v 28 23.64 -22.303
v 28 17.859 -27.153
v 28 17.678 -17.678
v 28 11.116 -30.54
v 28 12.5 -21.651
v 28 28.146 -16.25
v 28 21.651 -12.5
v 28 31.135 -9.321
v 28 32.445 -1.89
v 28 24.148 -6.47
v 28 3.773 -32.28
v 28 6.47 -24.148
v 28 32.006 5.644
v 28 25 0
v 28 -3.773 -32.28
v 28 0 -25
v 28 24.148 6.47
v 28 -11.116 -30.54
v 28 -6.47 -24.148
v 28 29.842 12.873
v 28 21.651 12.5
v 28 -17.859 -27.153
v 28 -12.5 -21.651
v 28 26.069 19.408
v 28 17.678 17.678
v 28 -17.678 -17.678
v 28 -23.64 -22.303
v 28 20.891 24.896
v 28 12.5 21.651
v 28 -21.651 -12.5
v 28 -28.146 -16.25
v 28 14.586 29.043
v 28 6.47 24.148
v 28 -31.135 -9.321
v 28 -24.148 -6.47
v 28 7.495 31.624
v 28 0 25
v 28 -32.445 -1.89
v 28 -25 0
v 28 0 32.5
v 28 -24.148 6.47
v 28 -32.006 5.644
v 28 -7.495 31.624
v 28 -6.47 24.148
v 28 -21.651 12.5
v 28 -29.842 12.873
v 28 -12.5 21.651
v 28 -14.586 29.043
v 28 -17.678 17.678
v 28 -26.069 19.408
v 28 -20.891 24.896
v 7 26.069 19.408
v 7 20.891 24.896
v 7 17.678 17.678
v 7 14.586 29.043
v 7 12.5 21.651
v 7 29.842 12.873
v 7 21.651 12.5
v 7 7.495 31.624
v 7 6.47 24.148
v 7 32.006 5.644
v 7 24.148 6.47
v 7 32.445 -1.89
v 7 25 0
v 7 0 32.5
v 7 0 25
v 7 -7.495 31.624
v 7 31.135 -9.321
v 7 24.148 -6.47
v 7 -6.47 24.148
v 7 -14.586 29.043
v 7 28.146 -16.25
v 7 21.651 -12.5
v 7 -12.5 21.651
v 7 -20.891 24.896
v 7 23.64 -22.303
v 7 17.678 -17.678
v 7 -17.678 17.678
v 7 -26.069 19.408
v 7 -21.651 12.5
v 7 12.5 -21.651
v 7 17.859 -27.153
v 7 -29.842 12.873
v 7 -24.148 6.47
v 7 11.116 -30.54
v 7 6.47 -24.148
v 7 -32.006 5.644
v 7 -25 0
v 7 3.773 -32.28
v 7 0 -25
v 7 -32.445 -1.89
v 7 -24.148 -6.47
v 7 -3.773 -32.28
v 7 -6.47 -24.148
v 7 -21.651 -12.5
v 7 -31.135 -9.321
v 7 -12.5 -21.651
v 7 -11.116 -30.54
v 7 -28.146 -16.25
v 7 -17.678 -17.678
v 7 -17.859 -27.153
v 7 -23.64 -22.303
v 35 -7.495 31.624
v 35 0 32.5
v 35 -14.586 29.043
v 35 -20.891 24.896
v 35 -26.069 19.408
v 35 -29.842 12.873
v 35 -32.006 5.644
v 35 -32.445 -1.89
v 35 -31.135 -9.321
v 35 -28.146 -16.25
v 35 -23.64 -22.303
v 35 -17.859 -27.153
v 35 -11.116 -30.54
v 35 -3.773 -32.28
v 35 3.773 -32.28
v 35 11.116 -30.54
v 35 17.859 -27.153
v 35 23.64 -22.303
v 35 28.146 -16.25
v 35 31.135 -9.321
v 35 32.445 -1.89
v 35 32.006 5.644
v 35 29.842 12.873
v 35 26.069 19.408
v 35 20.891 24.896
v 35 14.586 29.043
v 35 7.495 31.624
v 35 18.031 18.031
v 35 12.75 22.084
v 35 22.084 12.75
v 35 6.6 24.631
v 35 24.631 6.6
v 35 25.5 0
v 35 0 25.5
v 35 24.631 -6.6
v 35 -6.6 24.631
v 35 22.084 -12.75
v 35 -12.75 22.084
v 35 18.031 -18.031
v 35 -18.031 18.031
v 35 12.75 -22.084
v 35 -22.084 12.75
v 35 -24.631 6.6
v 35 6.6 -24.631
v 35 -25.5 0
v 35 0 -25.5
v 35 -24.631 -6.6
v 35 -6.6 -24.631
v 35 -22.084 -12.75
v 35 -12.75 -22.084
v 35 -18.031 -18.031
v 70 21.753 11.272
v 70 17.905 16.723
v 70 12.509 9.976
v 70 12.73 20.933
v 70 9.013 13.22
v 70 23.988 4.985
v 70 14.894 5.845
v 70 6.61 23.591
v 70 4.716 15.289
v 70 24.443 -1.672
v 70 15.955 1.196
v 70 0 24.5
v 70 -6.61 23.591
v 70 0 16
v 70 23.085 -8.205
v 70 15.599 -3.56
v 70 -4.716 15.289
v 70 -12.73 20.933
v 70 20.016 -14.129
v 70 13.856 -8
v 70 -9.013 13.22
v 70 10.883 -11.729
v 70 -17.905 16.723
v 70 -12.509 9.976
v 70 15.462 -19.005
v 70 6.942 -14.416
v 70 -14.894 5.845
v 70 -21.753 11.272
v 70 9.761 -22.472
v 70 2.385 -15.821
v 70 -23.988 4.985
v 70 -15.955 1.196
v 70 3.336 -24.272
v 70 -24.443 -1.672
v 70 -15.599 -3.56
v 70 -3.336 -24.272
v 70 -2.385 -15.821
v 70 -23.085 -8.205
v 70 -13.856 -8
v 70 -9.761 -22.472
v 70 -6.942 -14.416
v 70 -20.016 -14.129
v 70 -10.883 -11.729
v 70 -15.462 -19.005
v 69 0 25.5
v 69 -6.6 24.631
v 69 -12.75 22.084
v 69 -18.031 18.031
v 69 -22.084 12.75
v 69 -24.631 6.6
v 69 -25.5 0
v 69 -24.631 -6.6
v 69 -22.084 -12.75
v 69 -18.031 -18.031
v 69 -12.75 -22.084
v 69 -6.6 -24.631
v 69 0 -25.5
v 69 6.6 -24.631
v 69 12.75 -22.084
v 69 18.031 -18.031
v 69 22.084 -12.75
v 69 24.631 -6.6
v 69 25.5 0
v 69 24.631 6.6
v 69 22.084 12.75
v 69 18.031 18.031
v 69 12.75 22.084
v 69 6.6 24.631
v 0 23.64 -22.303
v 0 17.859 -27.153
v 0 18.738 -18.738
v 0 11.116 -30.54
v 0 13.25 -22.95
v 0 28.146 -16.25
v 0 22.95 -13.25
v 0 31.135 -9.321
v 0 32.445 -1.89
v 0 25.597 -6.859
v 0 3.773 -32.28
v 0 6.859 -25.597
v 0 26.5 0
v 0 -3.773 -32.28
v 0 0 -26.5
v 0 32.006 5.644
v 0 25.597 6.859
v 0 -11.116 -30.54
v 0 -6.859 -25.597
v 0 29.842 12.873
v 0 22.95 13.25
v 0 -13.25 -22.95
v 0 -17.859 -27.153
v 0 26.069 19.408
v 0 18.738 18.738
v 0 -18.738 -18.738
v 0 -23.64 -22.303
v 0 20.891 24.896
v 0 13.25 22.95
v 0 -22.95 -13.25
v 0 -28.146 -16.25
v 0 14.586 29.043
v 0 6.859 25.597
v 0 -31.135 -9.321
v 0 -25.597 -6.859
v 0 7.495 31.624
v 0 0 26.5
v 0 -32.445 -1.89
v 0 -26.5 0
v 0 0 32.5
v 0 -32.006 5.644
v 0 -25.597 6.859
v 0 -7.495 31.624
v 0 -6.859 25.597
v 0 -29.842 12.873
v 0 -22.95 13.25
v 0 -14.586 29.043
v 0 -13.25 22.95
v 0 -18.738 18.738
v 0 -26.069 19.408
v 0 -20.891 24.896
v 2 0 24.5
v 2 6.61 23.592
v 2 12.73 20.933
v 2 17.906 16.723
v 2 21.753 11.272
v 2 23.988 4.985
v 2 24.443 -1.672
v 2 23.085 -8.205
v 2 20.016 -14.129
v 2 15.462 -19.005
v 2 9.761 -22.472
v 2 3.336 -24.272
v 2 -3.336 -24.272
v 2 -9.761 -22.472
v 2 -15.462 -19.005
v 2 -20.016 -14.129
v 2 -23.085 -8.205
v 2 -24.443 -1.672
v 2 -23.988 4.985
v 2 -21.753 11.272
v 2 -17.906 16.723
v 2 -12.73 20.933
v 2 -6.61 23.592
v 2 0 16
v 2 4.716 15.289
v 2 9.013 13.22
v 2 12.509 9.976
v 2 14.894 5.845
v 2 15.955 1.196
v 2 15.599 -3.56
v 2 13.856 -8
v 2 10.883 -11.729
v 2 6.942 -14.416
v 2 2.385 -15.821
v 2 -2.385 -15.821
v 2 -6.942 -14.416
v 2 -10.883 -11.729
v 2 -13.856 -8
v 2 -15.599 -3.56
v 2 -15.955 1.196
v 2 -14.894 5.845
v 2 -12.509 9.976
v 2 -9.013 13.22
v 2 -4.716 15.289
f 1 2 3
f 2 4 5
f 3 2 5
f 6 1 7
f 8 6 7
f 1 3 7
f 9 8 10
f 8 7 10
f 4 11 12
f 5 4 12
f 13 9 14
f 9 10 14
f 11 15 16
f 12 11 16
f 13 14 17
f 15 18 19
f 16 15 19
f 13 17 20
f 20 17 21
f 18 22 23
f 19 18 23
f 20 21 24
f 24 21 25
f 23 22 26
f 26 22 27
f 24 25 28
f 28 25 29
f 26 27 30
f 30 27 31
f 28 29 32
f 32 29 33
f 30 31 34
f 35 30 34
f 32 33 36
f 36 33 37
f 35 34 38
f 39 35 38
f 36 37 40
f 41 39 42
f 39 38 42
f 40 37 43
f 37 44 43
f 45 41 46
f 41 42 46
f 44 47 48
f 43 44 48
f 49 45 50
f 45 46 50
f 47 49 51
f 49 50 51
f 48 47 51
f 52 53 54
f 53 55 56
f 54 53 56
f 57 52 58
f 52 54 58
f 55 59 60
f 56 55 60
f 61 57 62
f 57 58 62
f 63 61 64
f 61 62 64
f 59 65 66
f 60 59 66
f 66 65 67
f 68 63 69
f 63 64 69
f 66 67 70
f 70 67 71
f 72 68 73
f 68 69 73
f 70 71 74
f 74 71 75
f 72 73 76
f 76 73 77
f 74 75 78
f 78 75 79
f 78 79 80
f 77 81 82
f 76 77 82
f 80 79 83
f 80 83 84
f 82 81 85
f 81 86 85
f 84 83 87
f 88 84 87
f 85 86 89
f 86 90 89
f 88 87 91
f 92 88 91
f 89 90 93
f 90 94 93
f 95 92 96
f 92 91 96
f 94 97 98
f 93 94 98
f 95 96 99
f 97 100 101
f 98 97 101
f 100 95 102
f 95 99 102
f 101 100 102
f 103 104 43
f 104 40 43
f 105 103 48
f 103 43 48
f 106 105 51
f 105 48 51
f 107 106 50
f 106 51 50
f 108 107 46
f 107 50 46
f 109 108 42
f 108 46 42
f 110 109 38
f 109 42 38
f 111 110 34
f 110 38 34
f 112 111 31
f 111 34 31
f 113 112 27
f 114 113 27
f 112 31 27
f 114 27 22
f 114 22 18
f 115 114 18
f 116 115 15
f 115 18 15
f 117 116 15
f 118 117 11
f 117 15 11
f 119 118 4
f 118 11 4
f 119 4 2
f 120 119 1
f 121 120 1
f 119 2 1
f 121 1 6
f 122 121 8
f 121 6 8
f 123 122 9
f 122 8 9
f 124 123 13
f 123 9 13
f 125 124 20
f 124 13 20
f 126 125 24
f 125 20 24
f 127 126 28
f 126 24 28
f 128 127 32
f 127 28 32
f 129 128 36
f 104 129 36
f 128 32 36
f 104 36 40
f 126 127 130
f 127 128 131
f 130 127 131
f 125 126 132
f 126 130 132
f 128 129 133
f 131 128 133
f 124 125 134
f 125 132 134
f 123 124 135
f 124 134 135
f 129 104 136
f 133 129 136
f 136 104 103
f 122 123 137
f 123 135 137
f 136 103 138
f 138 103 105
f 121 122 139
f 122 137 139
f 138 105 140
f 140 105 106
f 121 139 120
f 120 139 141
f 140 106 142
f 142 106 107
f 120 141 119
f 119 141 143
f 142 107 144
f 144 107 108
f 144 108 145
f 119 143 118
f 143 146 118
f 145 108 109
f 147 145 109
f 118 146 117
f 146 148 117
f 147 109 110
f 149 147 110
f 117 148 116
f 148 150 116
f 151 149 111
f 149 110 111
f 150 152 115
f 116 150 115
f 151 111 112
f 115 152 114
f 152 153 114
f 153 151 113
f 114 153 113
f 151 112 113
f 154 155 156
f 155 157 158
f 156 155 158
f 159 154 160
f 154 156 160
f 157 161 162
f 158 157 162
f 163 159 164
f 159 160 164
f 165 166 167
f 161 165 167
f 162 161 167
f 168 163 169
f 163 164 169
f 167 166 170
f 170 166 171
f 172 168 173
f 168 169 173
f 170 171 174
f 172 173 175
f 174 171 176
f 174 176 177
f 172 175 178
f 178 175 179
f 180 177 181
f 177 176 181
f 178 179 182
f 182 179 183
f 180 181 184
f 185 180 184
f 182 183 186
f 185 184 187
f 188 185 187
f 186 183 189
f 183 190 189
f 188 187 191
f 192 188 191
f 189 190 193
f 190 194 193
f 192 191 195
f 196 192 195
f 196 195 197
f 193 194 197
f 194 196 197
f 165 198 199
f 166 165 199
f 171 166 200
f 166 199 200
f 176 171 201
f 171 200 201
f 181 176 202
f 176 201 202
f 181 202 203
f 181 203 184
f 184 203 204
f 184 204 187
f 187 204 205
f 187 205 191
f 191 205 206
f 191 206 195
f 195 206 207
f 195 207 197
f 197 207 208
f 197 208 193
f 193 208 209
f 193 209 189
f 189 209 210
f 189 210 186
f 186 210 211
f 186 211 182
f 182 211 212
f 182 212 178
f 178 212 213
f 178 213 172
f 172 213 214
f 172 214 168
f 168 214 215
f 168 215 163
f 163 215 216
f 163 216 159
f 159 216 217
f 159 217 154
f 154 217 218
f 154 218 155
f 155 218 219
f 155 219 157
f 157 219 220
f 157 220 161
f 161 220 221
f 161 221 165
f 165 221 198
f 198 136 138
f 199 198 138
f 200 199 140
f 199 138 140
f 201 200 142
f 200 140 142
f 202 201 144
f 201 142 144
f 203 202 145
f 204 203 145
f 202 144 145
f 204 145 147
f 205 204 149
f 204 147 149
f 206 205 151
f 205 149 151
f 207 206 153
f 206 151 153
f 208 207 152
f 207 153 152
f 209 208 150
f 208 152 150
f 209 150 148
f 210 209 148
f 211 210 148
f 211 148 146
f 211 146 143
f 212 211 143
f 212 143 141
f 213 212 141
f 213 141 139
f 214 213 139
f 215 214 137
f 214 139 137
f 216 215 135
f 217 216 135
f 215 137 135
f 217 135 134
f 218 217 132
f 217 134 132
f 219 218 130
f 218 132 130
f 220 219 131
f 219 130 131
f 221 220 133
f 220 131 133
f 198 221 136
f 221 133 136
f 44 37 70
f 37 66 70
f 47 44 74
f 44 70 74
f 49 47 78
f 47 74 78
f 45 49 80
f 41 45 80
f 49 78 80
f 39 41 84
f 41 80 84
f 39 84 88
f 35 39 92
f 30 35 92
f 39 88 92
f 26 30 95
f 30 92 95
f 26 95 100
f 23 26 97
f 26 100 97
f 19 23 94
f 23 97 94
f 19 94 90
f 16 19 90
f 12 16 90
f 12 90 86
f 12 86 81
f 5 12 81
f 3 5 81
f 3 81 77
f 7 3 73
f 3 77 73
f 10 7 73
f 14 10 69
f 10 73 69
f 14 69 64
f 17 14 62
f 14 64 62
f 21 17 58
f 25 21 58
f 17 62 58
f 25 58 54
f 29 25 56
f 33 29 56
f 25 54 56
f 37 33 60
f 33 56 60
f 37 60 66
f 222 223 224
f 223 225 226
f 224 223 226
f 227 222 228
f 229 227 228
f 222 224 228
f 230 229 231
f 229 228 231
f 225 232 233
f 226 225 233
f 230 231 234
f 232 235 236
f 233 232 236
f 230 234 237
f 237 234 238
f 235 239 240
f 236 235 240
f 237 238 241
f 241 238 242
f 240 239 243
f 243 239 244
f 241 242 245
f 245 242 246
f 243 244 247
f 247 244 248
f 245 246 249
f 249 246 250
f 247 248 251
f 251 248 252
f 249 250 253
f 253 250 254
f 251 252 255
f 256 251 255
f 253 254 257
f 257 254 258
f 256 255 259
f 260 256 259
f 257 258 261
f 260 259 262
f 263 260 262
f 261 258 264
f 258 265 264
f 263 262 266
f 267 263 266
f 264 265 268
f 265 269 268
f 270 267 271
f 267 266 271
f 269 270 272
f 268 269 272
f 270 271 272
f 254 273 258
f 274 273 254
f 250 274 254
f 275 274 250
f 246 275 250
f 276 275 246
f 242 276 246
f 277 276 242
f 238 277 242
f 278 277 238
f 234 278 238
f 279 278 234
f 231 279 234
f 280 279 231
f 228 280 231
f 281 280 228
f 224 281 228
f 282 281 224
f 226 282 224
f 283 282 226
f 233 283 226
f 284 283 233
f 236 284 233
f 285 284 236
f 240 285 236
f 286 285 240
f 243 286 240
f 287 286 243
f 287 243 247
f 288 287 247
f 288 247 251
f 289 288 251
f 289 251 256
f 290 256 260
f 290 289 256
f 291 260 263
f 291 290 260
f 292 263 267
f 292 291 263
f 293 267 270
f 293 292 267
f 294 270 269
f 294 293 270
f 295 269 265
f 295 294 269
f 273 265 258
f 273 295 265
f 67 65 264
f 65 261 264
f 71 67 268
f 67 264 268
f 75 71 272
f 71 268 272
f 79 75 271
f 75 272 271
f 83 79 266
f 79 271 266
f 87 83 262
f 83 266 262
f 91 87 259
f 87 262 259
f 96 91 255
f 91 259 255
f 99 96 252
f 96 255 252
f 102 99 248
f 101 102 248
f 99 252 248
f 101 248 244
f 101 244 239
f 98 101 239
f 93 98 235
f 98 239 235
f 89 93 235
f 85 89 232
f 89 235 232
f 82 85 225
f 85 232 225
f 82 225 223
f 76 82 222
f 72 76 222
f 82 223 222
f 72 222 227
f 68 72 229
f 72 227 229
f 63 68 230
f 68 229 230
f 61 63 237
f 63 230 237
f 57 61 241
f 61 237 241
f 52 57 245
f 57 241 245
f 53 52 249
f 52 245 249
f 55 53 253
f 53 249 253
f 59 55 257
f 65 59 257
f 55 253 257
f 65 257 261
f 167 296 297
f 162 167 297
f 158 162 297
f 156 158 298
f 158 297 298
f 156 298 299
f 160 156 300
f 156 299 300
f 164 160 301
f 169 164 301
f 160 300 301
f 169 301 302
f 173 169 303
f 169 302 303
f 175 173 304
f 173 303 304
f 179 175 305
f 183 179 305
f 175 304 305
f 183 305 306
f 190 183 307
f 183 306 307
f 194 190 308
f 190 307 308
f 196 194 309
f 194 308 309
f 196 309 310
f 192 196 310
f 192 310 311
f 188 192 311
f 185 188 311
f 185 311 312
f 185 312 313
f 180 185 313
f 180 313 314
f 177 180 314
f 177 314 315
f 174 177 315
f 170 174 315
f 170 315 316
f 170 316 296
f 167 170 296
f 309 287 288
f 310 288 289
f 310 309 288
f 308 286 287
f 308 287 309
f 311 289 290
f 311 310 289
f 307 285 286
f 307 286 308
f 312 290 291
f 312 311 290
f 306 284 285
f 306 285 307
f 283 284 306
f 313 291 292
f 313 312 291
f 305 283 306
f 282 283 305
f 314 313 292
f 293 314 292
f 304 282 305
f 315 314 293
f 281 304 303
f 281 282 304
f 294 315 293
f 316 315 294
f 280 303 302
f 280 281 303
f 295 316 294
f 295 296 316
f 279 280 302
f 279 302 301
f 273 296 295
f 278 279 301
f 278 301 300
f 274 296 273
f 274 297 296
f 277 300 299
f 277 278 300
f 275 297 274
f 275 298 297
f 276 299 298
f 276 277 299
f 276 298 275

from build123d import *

# Parameters (mm, degrees)
SKETCH2_R          = 26.5
CUT_EXTRUDE1_DEPTH = 2
CHAMFER1_SIZE      = 2
SKETCH3_R          = 16
CUT_EXTRUDE2_DEPTH = 83.076184122
CHAMFER3_SIZE      = 1


with BuildPart() as part:
    # Sketch1 → Revolve1 (revolve)
    with BuildSketch(Plane(origin=(0, 0, 0), x_dir=(1, 0, 0), z_dir=(0, 1, 0))):
        Polygon((0, 0), (70, 0), (70, -25.5), (35, -25.5), (35, -32.5), (28, -32.5), (28, -25), (7, -25), (7, -32.5), (0, -32.5), align=None)
    revolve(axis=Axis((0, 0, 0), (1, 0, 0)))

    # Sketch2 → Cut-Extrude1 (cut)
    with BuildSketch(Plane.ZY):
        Circle(SKETCH2_R)
    extrude(amount=-CUT_EXTRUDE1_DEPTH, mode=Mode.SUBTRACT)

    # Chamfer1
    chamfer1_edges = [part.edges().sort_by_distance(p)[0] for p in [
        (2, 0, -26.5),
    ]]
    chamfer(chamfer1_edges, length=CHAMFER1_SIZE - 0.0001)  # a hair under: the kernel refuses the full size

    # Sketch3 → Cut-Extrude2 (cut, through all)
    with BuildSketch(Plane.ZY.offset(-2)):
        Circle(SKETCH3_R)
    extrude(amount=-CUT_EXTRUDE2_DEPTH, mode=Mode.SUBTRACT)

    # Chamfer3
    chamfer3_edges = [part.edges().sort_by_distance(p)[0] for p in [
        (70, 0, -25.5),
    ]]
    chamfer(chamfer3_edges, length=CHAMFER3_SIZE)


solid = part.part
